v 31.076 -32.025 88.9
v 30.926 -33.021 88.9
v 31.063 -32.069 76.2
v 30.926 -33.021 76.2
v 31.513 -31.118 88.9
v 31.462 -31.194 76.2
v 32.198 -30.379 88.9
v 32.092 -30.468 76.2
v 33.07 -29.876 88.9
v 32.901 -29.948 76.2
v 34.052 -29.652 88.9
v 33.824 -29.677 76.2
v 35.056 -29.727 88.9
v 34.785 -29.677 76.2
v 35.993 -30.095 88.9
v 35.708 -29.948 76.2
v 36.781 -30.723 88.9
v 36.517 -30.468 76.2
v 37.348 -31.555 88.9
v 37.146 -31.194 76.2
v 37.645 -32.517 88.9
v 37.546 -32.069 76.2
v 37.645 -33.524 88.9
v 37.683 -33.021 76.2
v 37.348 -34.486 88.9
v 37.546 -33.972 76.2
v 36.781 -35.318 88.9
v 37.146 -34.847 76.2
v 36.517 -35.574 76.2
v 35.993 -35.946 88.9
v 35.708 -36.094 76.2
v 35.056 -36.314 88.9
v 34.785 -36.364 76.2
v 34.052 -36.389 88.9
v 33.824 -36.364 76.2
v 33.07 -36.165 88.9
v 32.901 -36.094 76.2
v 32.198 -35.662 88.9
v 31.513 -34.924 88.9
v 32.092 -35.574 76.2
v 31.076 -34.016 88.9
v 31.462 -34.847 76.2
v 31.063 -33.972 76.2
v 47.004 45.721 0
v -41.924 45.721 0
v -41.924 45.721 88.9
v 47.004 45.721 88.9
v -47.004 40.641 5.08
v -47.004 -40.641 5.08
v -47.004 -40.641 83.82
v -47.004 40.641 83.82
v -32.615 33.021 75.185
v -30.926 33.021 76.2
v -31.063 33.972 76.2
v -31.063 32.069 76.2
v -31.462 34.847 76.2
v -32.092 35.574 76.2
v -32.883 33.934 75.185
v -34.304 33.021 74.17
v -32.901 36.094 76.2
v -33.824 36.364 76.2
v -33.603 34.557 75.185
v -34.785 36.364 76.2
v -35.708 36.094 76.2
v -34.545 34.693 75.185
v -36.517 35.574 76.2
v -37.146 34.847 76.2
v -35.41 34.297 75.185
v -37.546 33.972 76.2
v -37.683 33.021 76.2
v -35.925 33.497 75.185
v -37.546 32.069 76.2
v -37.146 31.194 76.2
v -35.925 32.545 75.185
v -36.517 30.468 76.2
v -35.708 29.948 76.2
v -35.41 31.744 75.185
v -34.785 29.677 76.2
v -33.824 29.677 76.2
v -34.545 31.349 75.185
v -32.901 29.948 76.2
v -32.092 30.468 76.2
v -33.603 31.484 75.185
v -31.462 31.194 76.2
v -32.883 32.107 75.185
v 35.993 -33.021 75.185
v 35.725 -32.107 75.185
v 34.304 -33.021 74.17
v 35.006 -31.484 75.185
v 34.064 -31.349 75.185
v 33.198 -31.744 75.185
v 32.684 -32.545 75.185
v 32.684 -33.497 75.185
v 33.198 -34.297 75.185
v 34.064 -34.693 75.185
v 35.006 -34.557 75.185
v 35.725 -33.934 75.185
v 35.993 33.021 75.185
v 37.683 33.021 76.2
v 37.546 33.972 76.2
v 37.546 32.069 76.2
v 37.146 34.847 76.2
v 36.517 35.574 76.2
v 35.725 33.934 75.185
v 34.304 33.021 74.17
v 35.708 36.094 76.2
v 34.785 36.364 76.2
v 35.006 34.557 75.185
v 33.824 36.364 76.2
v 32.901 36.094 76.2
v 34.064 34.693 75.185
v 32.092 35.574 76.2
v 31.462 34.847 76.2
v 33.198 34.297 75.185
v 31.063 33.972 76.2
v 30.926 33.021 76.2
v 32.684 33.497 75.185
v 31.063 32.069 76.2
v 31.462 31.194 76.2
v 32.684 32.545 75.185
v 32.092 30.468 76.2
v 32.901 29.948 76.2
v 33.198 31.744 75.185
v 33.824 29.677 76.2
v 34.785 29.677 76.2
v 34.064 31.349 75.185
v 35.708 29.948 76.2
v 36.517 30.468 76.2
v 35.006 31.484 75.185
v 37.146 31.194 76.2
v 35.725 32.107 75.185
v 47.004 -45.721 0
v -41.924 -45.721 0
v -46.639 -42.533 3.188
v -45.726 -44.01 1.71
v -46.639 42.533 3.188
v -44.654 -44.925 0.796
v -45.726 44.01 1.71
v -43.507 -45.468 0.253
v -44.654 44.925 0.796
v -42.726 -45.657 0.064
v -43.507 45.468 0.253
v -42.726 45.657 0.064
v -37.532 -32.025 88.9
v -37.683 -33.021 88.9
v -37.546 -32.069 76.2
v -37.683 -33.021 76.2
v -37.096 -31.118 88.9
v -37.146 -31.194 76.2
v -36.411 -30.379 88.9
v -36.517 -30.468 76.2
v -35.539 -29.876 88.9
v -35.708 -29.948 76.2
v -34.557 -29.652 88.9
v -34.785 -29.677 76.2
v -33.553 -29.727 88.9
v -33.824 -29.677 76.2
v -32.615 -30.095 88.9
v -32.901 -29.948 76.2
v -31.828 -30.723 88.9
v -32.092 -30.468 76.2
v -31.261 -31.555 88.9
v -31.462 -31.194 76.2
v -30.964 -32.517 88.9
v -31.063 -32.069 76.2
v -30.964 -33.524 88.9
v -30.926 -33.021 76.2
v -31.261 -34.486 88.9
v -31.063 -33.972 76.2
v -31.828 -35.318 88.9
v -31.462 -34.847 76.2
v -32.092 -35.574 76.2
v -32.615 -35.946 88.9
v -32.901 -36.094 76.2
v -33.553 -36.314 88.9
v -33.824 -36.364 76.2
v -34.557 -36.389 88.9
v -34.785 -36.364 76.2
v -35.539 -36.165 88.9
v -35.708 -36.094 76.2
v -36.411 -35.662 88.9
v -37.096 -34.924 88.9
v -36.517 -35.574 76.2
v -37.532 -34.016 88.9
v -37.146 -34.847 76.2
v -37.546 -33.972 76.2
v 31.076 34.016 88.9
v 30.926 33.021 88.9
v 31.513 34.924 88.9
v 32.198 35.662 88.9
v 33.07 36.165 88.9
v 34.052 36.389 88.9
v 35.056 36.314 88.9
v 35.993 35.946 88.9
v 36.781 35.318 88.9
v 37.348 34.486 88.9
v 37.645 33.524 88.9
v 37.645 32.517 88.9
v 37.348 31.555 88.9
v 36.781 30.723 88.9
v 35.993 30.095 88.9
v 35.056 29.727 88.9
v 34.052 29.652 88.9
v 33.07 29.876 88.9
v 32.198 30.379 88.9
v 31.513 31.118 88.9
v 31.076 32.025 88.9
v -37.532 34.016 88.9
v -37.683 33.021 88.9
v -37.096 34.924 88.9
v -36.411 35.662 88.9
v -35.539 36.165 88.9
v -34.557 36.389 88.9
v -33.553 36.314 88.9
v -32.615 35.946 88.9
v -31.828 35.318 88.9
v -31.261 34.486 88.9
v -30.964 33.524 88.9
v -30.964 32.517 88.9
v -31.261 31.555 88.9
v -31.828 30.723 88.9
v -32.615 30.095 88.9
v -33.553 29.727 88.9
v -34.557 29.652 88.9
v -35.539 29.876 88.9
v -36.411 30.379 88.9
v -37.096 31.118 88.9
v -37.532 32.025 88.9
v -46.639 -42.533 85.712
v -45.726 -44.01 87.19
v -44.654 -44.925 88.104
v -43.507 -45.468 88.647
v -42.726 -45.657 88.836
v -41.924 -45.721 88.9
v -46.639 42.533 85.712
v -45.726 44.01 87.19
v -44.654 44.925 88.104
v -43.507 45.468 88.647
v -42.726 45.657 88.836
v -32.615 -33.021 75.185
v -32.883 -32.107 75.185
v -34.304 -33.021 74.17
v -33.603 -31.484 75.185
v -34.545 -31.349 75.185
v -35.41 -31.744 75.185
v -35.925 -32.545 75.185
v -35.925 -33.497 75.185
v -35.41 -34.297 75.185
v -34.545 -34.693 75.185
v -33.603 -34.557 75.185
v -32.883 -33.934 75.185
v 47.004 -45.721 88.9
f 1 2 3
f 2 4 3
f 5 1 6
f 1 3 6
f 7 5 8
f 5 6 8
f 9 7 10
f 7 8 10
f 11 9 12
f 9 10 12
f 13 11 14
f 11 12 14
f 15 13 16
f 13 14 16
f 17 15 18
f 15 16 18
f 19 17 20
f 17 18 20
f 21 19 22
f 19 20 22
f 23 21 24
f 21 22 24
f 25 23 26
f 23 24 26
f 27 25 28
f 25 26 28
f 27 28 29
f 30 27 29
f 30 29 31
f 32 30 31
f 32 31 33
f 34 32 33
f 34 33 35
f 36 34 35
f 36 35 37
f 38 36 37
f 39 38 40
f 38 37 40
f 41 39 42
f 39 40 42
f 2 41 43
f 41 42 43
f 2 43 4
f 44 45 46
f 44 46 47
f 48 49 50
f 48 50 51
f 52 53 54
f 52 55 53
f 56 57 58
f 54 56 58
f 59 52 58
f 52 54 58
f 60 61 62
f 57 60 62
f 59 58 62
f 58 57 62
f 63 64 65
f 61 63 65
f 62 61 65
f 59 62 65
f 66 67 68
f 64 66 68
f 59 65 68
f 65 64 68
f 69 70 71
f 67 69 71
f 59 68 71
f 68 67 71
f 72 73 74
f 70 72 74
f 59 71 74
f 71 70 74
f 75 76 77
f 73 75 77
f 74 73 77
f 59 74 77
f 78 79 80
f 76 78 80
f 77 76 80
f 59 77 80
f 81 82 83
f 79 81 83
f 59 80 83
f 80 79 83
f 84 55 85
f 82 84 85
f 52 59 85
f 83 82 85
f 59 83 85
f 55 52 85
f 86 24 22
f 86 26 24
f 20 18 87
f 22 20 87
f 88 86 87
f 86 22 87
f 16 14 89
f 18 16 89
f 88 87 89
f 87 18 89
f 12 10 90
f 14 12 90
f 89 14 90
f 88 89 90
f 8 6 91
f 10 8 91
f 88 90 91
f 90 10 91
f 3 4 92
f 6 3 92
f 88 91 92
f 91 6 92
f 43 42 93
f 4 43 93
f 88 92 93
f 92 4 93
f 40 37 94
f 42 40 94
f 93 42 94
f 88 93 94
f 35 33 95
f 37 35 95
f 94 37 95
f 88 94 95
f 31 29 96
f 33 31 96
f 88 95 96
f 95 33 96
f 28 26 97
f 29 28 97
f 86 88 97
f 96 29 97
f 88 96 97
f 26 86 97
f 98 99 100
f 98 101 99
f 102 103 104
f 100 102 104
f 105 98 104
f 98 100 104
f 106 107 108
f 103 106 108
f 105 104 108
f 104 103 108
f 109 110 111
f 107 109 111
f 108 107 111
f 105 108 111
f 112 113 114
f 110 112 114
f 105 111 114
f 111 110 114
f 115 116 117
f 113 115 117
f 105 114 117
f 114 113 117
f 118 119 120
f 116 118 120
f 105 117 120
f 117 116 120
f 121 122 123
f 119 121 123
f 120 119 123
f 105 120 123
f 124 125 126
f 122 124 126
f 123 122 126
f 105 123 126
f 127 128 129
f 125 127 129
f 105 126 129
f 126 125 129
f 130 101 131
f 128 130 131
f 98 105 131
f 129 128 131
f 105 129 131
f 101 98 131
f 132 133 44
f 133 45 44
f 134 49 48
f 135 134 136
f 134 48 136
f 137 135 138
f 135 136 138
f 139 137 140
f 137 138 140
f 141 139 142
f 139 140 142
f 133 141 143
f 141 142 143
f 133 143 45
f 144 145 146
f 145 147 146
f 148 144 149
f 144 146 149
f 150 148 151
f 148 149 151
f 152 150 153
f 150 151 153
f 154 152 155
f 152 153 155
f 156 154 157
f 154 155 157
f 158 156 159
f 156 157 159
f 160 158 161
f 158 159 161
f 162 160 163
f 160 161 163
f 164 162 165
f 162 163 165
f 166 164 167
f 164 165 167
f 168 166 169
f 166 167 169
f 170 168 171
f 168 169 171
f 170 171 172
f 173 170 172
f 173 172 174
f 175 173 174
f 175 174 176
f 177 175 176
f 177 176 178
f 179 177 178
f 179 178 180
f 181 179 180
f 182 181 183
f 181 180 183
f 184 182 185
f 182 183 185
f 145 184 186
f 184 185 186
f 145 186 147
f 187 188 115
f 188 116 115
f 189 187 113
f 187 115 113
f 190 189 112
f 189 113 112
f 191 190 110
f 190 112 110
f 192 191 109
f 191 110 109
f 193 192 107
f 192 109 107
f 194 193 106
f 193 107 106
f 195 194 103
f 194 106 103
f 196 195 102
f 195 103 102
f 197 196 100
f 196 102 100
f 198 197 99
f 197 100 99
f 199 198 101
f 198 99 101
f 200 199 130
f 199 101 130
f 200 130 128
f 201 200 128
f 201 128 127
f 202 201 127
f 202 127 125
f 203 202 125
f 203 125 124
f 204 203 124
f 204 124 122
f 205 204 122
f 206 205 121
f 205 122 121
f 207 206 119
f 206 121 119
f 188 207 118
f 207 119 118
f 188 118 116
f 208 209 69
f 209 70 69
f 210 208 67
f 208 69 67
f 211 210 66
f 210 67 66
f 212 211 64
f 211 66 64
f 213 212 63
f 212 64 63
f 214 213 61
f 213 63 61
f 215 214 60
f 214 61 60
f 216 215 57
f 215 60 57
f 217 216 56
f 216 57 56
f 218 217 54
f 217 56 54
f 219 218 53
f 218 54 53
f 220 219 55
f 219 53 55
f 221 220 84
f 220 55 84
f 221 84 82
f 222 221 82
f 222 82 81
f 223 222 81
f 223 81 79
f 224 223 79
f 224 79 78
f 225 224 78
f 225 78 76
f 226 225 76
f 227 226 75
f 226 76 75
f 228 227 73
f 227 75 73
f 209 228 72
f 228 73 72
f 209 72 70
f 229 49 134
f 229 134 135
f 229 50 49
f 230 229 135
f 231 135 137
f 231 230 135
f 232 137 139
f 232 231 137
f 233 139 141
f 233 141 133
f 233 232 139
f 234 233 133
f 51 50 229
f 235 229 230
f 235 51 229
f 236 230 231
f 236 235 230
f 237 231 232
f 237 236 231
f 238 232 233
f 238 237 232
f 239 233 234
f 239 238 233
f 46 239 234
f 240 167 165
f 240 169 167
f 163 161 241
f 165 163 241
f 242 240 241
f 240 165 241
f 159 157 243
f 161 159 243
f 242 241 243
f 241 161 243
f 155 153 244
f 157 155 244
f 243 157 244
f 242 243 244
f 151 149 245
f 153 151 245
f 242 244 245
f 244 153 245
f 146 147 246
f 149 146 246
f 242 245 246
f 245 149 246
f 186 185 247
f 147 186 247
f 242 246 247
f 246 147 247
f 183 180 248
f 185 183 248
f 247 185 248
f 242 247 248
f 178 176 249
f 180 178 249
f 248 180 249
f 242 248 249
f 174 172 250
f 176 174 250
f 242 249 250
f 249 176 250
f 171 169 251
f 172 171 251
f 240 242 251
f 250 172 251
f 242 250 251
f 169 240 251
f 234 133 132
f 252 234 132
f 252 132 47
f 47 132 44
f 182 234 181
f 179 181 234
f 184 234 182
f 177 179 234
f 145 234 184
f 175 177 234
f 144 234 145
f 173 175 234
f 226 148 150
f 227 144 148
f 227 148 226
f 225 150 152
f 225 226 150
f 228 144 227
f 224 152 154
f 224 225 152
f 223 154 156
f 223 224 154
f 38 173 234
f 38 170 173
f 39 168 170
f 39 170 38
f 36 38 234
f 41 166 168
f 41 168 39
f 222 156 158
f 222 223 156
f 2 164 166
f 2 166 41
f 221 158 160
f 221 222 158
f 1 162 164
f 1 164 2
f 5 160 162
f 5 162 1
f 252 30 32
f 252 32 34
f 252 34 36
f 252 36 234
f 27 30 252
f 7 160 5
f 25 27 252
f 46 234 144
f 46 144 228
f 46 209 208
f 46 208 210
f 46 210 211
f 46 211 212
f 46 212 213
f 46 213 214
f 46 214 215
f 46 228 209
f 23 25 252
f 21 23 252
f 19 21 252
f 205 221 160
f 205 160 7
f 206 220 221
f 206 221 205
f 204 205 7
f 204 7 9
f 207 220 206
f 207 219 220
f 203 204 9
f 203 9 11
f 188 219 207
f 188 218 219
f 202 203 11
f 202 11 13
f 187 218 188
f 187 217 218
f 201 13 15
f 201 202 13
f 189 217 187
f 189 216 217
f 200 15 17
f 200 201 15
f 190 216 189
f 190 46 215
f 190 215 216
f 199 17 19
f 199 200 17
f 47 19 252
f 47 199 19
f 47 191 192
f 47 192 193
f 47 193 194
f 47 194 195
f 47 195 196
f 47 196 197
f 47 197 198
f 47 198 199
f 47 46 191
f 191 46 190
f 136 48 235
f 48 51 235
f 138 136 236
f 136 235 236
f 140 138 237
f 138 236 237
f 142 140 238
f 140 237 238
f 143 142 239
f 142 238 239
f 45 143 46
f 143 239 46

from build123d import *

# Parameters (mm, degrees)
F0_W     = 94.0087363124
F0_H     = 91.4413630962
F1_DEPTH = 88.9
F3_D     = 6.7564
F3_DEPTH = 12.7
F3_TIP   = 2.0298273432
F6_R     = 5.08


# Not quite as in the source:
# - the program builds the solid bodies; features that only make, move or delete a surface that nothing else refers to are left out


with BuildPart() as f1:
    # F0 (on Top) → F1 (new body)
    with BuildSketch(Plane.XY):
        Rectangle(F0_W, F0_H)
    extrude(amount=F1_DEPTH)

    # F3
    with Locations(Plane.XY.offset(88.9)):
        with Locations((-34.3043681562, 33.0206815481), (34.3043681562, 33.0206815481), (34.3043681562, -33.0206815481), (-34.3043681562, -33.0206815481)):
            Hole(F3_D / 2, depth=F3_DEPTH)
            with Locations((0, 0, -(F3_DEPTH + F3_TIP / 2))):  # 118° drill point
                Cone(0, F3_D / 2, F3_TIP, mode=Mode.SUBTRACT)

    # F6
    f6_edges = [f1.edges().sort_by_distance(p)[0] for p in [
        (-47.004368, 45.720682, 44.45),
        (-47.004368, -45.720682, 44.45),
        (-47.004368, 0, 0),
        (-47.004368, 0, 88.9),
    ]]
    fillet(f6_edges, radius=F6_R)


solid = f1.part
